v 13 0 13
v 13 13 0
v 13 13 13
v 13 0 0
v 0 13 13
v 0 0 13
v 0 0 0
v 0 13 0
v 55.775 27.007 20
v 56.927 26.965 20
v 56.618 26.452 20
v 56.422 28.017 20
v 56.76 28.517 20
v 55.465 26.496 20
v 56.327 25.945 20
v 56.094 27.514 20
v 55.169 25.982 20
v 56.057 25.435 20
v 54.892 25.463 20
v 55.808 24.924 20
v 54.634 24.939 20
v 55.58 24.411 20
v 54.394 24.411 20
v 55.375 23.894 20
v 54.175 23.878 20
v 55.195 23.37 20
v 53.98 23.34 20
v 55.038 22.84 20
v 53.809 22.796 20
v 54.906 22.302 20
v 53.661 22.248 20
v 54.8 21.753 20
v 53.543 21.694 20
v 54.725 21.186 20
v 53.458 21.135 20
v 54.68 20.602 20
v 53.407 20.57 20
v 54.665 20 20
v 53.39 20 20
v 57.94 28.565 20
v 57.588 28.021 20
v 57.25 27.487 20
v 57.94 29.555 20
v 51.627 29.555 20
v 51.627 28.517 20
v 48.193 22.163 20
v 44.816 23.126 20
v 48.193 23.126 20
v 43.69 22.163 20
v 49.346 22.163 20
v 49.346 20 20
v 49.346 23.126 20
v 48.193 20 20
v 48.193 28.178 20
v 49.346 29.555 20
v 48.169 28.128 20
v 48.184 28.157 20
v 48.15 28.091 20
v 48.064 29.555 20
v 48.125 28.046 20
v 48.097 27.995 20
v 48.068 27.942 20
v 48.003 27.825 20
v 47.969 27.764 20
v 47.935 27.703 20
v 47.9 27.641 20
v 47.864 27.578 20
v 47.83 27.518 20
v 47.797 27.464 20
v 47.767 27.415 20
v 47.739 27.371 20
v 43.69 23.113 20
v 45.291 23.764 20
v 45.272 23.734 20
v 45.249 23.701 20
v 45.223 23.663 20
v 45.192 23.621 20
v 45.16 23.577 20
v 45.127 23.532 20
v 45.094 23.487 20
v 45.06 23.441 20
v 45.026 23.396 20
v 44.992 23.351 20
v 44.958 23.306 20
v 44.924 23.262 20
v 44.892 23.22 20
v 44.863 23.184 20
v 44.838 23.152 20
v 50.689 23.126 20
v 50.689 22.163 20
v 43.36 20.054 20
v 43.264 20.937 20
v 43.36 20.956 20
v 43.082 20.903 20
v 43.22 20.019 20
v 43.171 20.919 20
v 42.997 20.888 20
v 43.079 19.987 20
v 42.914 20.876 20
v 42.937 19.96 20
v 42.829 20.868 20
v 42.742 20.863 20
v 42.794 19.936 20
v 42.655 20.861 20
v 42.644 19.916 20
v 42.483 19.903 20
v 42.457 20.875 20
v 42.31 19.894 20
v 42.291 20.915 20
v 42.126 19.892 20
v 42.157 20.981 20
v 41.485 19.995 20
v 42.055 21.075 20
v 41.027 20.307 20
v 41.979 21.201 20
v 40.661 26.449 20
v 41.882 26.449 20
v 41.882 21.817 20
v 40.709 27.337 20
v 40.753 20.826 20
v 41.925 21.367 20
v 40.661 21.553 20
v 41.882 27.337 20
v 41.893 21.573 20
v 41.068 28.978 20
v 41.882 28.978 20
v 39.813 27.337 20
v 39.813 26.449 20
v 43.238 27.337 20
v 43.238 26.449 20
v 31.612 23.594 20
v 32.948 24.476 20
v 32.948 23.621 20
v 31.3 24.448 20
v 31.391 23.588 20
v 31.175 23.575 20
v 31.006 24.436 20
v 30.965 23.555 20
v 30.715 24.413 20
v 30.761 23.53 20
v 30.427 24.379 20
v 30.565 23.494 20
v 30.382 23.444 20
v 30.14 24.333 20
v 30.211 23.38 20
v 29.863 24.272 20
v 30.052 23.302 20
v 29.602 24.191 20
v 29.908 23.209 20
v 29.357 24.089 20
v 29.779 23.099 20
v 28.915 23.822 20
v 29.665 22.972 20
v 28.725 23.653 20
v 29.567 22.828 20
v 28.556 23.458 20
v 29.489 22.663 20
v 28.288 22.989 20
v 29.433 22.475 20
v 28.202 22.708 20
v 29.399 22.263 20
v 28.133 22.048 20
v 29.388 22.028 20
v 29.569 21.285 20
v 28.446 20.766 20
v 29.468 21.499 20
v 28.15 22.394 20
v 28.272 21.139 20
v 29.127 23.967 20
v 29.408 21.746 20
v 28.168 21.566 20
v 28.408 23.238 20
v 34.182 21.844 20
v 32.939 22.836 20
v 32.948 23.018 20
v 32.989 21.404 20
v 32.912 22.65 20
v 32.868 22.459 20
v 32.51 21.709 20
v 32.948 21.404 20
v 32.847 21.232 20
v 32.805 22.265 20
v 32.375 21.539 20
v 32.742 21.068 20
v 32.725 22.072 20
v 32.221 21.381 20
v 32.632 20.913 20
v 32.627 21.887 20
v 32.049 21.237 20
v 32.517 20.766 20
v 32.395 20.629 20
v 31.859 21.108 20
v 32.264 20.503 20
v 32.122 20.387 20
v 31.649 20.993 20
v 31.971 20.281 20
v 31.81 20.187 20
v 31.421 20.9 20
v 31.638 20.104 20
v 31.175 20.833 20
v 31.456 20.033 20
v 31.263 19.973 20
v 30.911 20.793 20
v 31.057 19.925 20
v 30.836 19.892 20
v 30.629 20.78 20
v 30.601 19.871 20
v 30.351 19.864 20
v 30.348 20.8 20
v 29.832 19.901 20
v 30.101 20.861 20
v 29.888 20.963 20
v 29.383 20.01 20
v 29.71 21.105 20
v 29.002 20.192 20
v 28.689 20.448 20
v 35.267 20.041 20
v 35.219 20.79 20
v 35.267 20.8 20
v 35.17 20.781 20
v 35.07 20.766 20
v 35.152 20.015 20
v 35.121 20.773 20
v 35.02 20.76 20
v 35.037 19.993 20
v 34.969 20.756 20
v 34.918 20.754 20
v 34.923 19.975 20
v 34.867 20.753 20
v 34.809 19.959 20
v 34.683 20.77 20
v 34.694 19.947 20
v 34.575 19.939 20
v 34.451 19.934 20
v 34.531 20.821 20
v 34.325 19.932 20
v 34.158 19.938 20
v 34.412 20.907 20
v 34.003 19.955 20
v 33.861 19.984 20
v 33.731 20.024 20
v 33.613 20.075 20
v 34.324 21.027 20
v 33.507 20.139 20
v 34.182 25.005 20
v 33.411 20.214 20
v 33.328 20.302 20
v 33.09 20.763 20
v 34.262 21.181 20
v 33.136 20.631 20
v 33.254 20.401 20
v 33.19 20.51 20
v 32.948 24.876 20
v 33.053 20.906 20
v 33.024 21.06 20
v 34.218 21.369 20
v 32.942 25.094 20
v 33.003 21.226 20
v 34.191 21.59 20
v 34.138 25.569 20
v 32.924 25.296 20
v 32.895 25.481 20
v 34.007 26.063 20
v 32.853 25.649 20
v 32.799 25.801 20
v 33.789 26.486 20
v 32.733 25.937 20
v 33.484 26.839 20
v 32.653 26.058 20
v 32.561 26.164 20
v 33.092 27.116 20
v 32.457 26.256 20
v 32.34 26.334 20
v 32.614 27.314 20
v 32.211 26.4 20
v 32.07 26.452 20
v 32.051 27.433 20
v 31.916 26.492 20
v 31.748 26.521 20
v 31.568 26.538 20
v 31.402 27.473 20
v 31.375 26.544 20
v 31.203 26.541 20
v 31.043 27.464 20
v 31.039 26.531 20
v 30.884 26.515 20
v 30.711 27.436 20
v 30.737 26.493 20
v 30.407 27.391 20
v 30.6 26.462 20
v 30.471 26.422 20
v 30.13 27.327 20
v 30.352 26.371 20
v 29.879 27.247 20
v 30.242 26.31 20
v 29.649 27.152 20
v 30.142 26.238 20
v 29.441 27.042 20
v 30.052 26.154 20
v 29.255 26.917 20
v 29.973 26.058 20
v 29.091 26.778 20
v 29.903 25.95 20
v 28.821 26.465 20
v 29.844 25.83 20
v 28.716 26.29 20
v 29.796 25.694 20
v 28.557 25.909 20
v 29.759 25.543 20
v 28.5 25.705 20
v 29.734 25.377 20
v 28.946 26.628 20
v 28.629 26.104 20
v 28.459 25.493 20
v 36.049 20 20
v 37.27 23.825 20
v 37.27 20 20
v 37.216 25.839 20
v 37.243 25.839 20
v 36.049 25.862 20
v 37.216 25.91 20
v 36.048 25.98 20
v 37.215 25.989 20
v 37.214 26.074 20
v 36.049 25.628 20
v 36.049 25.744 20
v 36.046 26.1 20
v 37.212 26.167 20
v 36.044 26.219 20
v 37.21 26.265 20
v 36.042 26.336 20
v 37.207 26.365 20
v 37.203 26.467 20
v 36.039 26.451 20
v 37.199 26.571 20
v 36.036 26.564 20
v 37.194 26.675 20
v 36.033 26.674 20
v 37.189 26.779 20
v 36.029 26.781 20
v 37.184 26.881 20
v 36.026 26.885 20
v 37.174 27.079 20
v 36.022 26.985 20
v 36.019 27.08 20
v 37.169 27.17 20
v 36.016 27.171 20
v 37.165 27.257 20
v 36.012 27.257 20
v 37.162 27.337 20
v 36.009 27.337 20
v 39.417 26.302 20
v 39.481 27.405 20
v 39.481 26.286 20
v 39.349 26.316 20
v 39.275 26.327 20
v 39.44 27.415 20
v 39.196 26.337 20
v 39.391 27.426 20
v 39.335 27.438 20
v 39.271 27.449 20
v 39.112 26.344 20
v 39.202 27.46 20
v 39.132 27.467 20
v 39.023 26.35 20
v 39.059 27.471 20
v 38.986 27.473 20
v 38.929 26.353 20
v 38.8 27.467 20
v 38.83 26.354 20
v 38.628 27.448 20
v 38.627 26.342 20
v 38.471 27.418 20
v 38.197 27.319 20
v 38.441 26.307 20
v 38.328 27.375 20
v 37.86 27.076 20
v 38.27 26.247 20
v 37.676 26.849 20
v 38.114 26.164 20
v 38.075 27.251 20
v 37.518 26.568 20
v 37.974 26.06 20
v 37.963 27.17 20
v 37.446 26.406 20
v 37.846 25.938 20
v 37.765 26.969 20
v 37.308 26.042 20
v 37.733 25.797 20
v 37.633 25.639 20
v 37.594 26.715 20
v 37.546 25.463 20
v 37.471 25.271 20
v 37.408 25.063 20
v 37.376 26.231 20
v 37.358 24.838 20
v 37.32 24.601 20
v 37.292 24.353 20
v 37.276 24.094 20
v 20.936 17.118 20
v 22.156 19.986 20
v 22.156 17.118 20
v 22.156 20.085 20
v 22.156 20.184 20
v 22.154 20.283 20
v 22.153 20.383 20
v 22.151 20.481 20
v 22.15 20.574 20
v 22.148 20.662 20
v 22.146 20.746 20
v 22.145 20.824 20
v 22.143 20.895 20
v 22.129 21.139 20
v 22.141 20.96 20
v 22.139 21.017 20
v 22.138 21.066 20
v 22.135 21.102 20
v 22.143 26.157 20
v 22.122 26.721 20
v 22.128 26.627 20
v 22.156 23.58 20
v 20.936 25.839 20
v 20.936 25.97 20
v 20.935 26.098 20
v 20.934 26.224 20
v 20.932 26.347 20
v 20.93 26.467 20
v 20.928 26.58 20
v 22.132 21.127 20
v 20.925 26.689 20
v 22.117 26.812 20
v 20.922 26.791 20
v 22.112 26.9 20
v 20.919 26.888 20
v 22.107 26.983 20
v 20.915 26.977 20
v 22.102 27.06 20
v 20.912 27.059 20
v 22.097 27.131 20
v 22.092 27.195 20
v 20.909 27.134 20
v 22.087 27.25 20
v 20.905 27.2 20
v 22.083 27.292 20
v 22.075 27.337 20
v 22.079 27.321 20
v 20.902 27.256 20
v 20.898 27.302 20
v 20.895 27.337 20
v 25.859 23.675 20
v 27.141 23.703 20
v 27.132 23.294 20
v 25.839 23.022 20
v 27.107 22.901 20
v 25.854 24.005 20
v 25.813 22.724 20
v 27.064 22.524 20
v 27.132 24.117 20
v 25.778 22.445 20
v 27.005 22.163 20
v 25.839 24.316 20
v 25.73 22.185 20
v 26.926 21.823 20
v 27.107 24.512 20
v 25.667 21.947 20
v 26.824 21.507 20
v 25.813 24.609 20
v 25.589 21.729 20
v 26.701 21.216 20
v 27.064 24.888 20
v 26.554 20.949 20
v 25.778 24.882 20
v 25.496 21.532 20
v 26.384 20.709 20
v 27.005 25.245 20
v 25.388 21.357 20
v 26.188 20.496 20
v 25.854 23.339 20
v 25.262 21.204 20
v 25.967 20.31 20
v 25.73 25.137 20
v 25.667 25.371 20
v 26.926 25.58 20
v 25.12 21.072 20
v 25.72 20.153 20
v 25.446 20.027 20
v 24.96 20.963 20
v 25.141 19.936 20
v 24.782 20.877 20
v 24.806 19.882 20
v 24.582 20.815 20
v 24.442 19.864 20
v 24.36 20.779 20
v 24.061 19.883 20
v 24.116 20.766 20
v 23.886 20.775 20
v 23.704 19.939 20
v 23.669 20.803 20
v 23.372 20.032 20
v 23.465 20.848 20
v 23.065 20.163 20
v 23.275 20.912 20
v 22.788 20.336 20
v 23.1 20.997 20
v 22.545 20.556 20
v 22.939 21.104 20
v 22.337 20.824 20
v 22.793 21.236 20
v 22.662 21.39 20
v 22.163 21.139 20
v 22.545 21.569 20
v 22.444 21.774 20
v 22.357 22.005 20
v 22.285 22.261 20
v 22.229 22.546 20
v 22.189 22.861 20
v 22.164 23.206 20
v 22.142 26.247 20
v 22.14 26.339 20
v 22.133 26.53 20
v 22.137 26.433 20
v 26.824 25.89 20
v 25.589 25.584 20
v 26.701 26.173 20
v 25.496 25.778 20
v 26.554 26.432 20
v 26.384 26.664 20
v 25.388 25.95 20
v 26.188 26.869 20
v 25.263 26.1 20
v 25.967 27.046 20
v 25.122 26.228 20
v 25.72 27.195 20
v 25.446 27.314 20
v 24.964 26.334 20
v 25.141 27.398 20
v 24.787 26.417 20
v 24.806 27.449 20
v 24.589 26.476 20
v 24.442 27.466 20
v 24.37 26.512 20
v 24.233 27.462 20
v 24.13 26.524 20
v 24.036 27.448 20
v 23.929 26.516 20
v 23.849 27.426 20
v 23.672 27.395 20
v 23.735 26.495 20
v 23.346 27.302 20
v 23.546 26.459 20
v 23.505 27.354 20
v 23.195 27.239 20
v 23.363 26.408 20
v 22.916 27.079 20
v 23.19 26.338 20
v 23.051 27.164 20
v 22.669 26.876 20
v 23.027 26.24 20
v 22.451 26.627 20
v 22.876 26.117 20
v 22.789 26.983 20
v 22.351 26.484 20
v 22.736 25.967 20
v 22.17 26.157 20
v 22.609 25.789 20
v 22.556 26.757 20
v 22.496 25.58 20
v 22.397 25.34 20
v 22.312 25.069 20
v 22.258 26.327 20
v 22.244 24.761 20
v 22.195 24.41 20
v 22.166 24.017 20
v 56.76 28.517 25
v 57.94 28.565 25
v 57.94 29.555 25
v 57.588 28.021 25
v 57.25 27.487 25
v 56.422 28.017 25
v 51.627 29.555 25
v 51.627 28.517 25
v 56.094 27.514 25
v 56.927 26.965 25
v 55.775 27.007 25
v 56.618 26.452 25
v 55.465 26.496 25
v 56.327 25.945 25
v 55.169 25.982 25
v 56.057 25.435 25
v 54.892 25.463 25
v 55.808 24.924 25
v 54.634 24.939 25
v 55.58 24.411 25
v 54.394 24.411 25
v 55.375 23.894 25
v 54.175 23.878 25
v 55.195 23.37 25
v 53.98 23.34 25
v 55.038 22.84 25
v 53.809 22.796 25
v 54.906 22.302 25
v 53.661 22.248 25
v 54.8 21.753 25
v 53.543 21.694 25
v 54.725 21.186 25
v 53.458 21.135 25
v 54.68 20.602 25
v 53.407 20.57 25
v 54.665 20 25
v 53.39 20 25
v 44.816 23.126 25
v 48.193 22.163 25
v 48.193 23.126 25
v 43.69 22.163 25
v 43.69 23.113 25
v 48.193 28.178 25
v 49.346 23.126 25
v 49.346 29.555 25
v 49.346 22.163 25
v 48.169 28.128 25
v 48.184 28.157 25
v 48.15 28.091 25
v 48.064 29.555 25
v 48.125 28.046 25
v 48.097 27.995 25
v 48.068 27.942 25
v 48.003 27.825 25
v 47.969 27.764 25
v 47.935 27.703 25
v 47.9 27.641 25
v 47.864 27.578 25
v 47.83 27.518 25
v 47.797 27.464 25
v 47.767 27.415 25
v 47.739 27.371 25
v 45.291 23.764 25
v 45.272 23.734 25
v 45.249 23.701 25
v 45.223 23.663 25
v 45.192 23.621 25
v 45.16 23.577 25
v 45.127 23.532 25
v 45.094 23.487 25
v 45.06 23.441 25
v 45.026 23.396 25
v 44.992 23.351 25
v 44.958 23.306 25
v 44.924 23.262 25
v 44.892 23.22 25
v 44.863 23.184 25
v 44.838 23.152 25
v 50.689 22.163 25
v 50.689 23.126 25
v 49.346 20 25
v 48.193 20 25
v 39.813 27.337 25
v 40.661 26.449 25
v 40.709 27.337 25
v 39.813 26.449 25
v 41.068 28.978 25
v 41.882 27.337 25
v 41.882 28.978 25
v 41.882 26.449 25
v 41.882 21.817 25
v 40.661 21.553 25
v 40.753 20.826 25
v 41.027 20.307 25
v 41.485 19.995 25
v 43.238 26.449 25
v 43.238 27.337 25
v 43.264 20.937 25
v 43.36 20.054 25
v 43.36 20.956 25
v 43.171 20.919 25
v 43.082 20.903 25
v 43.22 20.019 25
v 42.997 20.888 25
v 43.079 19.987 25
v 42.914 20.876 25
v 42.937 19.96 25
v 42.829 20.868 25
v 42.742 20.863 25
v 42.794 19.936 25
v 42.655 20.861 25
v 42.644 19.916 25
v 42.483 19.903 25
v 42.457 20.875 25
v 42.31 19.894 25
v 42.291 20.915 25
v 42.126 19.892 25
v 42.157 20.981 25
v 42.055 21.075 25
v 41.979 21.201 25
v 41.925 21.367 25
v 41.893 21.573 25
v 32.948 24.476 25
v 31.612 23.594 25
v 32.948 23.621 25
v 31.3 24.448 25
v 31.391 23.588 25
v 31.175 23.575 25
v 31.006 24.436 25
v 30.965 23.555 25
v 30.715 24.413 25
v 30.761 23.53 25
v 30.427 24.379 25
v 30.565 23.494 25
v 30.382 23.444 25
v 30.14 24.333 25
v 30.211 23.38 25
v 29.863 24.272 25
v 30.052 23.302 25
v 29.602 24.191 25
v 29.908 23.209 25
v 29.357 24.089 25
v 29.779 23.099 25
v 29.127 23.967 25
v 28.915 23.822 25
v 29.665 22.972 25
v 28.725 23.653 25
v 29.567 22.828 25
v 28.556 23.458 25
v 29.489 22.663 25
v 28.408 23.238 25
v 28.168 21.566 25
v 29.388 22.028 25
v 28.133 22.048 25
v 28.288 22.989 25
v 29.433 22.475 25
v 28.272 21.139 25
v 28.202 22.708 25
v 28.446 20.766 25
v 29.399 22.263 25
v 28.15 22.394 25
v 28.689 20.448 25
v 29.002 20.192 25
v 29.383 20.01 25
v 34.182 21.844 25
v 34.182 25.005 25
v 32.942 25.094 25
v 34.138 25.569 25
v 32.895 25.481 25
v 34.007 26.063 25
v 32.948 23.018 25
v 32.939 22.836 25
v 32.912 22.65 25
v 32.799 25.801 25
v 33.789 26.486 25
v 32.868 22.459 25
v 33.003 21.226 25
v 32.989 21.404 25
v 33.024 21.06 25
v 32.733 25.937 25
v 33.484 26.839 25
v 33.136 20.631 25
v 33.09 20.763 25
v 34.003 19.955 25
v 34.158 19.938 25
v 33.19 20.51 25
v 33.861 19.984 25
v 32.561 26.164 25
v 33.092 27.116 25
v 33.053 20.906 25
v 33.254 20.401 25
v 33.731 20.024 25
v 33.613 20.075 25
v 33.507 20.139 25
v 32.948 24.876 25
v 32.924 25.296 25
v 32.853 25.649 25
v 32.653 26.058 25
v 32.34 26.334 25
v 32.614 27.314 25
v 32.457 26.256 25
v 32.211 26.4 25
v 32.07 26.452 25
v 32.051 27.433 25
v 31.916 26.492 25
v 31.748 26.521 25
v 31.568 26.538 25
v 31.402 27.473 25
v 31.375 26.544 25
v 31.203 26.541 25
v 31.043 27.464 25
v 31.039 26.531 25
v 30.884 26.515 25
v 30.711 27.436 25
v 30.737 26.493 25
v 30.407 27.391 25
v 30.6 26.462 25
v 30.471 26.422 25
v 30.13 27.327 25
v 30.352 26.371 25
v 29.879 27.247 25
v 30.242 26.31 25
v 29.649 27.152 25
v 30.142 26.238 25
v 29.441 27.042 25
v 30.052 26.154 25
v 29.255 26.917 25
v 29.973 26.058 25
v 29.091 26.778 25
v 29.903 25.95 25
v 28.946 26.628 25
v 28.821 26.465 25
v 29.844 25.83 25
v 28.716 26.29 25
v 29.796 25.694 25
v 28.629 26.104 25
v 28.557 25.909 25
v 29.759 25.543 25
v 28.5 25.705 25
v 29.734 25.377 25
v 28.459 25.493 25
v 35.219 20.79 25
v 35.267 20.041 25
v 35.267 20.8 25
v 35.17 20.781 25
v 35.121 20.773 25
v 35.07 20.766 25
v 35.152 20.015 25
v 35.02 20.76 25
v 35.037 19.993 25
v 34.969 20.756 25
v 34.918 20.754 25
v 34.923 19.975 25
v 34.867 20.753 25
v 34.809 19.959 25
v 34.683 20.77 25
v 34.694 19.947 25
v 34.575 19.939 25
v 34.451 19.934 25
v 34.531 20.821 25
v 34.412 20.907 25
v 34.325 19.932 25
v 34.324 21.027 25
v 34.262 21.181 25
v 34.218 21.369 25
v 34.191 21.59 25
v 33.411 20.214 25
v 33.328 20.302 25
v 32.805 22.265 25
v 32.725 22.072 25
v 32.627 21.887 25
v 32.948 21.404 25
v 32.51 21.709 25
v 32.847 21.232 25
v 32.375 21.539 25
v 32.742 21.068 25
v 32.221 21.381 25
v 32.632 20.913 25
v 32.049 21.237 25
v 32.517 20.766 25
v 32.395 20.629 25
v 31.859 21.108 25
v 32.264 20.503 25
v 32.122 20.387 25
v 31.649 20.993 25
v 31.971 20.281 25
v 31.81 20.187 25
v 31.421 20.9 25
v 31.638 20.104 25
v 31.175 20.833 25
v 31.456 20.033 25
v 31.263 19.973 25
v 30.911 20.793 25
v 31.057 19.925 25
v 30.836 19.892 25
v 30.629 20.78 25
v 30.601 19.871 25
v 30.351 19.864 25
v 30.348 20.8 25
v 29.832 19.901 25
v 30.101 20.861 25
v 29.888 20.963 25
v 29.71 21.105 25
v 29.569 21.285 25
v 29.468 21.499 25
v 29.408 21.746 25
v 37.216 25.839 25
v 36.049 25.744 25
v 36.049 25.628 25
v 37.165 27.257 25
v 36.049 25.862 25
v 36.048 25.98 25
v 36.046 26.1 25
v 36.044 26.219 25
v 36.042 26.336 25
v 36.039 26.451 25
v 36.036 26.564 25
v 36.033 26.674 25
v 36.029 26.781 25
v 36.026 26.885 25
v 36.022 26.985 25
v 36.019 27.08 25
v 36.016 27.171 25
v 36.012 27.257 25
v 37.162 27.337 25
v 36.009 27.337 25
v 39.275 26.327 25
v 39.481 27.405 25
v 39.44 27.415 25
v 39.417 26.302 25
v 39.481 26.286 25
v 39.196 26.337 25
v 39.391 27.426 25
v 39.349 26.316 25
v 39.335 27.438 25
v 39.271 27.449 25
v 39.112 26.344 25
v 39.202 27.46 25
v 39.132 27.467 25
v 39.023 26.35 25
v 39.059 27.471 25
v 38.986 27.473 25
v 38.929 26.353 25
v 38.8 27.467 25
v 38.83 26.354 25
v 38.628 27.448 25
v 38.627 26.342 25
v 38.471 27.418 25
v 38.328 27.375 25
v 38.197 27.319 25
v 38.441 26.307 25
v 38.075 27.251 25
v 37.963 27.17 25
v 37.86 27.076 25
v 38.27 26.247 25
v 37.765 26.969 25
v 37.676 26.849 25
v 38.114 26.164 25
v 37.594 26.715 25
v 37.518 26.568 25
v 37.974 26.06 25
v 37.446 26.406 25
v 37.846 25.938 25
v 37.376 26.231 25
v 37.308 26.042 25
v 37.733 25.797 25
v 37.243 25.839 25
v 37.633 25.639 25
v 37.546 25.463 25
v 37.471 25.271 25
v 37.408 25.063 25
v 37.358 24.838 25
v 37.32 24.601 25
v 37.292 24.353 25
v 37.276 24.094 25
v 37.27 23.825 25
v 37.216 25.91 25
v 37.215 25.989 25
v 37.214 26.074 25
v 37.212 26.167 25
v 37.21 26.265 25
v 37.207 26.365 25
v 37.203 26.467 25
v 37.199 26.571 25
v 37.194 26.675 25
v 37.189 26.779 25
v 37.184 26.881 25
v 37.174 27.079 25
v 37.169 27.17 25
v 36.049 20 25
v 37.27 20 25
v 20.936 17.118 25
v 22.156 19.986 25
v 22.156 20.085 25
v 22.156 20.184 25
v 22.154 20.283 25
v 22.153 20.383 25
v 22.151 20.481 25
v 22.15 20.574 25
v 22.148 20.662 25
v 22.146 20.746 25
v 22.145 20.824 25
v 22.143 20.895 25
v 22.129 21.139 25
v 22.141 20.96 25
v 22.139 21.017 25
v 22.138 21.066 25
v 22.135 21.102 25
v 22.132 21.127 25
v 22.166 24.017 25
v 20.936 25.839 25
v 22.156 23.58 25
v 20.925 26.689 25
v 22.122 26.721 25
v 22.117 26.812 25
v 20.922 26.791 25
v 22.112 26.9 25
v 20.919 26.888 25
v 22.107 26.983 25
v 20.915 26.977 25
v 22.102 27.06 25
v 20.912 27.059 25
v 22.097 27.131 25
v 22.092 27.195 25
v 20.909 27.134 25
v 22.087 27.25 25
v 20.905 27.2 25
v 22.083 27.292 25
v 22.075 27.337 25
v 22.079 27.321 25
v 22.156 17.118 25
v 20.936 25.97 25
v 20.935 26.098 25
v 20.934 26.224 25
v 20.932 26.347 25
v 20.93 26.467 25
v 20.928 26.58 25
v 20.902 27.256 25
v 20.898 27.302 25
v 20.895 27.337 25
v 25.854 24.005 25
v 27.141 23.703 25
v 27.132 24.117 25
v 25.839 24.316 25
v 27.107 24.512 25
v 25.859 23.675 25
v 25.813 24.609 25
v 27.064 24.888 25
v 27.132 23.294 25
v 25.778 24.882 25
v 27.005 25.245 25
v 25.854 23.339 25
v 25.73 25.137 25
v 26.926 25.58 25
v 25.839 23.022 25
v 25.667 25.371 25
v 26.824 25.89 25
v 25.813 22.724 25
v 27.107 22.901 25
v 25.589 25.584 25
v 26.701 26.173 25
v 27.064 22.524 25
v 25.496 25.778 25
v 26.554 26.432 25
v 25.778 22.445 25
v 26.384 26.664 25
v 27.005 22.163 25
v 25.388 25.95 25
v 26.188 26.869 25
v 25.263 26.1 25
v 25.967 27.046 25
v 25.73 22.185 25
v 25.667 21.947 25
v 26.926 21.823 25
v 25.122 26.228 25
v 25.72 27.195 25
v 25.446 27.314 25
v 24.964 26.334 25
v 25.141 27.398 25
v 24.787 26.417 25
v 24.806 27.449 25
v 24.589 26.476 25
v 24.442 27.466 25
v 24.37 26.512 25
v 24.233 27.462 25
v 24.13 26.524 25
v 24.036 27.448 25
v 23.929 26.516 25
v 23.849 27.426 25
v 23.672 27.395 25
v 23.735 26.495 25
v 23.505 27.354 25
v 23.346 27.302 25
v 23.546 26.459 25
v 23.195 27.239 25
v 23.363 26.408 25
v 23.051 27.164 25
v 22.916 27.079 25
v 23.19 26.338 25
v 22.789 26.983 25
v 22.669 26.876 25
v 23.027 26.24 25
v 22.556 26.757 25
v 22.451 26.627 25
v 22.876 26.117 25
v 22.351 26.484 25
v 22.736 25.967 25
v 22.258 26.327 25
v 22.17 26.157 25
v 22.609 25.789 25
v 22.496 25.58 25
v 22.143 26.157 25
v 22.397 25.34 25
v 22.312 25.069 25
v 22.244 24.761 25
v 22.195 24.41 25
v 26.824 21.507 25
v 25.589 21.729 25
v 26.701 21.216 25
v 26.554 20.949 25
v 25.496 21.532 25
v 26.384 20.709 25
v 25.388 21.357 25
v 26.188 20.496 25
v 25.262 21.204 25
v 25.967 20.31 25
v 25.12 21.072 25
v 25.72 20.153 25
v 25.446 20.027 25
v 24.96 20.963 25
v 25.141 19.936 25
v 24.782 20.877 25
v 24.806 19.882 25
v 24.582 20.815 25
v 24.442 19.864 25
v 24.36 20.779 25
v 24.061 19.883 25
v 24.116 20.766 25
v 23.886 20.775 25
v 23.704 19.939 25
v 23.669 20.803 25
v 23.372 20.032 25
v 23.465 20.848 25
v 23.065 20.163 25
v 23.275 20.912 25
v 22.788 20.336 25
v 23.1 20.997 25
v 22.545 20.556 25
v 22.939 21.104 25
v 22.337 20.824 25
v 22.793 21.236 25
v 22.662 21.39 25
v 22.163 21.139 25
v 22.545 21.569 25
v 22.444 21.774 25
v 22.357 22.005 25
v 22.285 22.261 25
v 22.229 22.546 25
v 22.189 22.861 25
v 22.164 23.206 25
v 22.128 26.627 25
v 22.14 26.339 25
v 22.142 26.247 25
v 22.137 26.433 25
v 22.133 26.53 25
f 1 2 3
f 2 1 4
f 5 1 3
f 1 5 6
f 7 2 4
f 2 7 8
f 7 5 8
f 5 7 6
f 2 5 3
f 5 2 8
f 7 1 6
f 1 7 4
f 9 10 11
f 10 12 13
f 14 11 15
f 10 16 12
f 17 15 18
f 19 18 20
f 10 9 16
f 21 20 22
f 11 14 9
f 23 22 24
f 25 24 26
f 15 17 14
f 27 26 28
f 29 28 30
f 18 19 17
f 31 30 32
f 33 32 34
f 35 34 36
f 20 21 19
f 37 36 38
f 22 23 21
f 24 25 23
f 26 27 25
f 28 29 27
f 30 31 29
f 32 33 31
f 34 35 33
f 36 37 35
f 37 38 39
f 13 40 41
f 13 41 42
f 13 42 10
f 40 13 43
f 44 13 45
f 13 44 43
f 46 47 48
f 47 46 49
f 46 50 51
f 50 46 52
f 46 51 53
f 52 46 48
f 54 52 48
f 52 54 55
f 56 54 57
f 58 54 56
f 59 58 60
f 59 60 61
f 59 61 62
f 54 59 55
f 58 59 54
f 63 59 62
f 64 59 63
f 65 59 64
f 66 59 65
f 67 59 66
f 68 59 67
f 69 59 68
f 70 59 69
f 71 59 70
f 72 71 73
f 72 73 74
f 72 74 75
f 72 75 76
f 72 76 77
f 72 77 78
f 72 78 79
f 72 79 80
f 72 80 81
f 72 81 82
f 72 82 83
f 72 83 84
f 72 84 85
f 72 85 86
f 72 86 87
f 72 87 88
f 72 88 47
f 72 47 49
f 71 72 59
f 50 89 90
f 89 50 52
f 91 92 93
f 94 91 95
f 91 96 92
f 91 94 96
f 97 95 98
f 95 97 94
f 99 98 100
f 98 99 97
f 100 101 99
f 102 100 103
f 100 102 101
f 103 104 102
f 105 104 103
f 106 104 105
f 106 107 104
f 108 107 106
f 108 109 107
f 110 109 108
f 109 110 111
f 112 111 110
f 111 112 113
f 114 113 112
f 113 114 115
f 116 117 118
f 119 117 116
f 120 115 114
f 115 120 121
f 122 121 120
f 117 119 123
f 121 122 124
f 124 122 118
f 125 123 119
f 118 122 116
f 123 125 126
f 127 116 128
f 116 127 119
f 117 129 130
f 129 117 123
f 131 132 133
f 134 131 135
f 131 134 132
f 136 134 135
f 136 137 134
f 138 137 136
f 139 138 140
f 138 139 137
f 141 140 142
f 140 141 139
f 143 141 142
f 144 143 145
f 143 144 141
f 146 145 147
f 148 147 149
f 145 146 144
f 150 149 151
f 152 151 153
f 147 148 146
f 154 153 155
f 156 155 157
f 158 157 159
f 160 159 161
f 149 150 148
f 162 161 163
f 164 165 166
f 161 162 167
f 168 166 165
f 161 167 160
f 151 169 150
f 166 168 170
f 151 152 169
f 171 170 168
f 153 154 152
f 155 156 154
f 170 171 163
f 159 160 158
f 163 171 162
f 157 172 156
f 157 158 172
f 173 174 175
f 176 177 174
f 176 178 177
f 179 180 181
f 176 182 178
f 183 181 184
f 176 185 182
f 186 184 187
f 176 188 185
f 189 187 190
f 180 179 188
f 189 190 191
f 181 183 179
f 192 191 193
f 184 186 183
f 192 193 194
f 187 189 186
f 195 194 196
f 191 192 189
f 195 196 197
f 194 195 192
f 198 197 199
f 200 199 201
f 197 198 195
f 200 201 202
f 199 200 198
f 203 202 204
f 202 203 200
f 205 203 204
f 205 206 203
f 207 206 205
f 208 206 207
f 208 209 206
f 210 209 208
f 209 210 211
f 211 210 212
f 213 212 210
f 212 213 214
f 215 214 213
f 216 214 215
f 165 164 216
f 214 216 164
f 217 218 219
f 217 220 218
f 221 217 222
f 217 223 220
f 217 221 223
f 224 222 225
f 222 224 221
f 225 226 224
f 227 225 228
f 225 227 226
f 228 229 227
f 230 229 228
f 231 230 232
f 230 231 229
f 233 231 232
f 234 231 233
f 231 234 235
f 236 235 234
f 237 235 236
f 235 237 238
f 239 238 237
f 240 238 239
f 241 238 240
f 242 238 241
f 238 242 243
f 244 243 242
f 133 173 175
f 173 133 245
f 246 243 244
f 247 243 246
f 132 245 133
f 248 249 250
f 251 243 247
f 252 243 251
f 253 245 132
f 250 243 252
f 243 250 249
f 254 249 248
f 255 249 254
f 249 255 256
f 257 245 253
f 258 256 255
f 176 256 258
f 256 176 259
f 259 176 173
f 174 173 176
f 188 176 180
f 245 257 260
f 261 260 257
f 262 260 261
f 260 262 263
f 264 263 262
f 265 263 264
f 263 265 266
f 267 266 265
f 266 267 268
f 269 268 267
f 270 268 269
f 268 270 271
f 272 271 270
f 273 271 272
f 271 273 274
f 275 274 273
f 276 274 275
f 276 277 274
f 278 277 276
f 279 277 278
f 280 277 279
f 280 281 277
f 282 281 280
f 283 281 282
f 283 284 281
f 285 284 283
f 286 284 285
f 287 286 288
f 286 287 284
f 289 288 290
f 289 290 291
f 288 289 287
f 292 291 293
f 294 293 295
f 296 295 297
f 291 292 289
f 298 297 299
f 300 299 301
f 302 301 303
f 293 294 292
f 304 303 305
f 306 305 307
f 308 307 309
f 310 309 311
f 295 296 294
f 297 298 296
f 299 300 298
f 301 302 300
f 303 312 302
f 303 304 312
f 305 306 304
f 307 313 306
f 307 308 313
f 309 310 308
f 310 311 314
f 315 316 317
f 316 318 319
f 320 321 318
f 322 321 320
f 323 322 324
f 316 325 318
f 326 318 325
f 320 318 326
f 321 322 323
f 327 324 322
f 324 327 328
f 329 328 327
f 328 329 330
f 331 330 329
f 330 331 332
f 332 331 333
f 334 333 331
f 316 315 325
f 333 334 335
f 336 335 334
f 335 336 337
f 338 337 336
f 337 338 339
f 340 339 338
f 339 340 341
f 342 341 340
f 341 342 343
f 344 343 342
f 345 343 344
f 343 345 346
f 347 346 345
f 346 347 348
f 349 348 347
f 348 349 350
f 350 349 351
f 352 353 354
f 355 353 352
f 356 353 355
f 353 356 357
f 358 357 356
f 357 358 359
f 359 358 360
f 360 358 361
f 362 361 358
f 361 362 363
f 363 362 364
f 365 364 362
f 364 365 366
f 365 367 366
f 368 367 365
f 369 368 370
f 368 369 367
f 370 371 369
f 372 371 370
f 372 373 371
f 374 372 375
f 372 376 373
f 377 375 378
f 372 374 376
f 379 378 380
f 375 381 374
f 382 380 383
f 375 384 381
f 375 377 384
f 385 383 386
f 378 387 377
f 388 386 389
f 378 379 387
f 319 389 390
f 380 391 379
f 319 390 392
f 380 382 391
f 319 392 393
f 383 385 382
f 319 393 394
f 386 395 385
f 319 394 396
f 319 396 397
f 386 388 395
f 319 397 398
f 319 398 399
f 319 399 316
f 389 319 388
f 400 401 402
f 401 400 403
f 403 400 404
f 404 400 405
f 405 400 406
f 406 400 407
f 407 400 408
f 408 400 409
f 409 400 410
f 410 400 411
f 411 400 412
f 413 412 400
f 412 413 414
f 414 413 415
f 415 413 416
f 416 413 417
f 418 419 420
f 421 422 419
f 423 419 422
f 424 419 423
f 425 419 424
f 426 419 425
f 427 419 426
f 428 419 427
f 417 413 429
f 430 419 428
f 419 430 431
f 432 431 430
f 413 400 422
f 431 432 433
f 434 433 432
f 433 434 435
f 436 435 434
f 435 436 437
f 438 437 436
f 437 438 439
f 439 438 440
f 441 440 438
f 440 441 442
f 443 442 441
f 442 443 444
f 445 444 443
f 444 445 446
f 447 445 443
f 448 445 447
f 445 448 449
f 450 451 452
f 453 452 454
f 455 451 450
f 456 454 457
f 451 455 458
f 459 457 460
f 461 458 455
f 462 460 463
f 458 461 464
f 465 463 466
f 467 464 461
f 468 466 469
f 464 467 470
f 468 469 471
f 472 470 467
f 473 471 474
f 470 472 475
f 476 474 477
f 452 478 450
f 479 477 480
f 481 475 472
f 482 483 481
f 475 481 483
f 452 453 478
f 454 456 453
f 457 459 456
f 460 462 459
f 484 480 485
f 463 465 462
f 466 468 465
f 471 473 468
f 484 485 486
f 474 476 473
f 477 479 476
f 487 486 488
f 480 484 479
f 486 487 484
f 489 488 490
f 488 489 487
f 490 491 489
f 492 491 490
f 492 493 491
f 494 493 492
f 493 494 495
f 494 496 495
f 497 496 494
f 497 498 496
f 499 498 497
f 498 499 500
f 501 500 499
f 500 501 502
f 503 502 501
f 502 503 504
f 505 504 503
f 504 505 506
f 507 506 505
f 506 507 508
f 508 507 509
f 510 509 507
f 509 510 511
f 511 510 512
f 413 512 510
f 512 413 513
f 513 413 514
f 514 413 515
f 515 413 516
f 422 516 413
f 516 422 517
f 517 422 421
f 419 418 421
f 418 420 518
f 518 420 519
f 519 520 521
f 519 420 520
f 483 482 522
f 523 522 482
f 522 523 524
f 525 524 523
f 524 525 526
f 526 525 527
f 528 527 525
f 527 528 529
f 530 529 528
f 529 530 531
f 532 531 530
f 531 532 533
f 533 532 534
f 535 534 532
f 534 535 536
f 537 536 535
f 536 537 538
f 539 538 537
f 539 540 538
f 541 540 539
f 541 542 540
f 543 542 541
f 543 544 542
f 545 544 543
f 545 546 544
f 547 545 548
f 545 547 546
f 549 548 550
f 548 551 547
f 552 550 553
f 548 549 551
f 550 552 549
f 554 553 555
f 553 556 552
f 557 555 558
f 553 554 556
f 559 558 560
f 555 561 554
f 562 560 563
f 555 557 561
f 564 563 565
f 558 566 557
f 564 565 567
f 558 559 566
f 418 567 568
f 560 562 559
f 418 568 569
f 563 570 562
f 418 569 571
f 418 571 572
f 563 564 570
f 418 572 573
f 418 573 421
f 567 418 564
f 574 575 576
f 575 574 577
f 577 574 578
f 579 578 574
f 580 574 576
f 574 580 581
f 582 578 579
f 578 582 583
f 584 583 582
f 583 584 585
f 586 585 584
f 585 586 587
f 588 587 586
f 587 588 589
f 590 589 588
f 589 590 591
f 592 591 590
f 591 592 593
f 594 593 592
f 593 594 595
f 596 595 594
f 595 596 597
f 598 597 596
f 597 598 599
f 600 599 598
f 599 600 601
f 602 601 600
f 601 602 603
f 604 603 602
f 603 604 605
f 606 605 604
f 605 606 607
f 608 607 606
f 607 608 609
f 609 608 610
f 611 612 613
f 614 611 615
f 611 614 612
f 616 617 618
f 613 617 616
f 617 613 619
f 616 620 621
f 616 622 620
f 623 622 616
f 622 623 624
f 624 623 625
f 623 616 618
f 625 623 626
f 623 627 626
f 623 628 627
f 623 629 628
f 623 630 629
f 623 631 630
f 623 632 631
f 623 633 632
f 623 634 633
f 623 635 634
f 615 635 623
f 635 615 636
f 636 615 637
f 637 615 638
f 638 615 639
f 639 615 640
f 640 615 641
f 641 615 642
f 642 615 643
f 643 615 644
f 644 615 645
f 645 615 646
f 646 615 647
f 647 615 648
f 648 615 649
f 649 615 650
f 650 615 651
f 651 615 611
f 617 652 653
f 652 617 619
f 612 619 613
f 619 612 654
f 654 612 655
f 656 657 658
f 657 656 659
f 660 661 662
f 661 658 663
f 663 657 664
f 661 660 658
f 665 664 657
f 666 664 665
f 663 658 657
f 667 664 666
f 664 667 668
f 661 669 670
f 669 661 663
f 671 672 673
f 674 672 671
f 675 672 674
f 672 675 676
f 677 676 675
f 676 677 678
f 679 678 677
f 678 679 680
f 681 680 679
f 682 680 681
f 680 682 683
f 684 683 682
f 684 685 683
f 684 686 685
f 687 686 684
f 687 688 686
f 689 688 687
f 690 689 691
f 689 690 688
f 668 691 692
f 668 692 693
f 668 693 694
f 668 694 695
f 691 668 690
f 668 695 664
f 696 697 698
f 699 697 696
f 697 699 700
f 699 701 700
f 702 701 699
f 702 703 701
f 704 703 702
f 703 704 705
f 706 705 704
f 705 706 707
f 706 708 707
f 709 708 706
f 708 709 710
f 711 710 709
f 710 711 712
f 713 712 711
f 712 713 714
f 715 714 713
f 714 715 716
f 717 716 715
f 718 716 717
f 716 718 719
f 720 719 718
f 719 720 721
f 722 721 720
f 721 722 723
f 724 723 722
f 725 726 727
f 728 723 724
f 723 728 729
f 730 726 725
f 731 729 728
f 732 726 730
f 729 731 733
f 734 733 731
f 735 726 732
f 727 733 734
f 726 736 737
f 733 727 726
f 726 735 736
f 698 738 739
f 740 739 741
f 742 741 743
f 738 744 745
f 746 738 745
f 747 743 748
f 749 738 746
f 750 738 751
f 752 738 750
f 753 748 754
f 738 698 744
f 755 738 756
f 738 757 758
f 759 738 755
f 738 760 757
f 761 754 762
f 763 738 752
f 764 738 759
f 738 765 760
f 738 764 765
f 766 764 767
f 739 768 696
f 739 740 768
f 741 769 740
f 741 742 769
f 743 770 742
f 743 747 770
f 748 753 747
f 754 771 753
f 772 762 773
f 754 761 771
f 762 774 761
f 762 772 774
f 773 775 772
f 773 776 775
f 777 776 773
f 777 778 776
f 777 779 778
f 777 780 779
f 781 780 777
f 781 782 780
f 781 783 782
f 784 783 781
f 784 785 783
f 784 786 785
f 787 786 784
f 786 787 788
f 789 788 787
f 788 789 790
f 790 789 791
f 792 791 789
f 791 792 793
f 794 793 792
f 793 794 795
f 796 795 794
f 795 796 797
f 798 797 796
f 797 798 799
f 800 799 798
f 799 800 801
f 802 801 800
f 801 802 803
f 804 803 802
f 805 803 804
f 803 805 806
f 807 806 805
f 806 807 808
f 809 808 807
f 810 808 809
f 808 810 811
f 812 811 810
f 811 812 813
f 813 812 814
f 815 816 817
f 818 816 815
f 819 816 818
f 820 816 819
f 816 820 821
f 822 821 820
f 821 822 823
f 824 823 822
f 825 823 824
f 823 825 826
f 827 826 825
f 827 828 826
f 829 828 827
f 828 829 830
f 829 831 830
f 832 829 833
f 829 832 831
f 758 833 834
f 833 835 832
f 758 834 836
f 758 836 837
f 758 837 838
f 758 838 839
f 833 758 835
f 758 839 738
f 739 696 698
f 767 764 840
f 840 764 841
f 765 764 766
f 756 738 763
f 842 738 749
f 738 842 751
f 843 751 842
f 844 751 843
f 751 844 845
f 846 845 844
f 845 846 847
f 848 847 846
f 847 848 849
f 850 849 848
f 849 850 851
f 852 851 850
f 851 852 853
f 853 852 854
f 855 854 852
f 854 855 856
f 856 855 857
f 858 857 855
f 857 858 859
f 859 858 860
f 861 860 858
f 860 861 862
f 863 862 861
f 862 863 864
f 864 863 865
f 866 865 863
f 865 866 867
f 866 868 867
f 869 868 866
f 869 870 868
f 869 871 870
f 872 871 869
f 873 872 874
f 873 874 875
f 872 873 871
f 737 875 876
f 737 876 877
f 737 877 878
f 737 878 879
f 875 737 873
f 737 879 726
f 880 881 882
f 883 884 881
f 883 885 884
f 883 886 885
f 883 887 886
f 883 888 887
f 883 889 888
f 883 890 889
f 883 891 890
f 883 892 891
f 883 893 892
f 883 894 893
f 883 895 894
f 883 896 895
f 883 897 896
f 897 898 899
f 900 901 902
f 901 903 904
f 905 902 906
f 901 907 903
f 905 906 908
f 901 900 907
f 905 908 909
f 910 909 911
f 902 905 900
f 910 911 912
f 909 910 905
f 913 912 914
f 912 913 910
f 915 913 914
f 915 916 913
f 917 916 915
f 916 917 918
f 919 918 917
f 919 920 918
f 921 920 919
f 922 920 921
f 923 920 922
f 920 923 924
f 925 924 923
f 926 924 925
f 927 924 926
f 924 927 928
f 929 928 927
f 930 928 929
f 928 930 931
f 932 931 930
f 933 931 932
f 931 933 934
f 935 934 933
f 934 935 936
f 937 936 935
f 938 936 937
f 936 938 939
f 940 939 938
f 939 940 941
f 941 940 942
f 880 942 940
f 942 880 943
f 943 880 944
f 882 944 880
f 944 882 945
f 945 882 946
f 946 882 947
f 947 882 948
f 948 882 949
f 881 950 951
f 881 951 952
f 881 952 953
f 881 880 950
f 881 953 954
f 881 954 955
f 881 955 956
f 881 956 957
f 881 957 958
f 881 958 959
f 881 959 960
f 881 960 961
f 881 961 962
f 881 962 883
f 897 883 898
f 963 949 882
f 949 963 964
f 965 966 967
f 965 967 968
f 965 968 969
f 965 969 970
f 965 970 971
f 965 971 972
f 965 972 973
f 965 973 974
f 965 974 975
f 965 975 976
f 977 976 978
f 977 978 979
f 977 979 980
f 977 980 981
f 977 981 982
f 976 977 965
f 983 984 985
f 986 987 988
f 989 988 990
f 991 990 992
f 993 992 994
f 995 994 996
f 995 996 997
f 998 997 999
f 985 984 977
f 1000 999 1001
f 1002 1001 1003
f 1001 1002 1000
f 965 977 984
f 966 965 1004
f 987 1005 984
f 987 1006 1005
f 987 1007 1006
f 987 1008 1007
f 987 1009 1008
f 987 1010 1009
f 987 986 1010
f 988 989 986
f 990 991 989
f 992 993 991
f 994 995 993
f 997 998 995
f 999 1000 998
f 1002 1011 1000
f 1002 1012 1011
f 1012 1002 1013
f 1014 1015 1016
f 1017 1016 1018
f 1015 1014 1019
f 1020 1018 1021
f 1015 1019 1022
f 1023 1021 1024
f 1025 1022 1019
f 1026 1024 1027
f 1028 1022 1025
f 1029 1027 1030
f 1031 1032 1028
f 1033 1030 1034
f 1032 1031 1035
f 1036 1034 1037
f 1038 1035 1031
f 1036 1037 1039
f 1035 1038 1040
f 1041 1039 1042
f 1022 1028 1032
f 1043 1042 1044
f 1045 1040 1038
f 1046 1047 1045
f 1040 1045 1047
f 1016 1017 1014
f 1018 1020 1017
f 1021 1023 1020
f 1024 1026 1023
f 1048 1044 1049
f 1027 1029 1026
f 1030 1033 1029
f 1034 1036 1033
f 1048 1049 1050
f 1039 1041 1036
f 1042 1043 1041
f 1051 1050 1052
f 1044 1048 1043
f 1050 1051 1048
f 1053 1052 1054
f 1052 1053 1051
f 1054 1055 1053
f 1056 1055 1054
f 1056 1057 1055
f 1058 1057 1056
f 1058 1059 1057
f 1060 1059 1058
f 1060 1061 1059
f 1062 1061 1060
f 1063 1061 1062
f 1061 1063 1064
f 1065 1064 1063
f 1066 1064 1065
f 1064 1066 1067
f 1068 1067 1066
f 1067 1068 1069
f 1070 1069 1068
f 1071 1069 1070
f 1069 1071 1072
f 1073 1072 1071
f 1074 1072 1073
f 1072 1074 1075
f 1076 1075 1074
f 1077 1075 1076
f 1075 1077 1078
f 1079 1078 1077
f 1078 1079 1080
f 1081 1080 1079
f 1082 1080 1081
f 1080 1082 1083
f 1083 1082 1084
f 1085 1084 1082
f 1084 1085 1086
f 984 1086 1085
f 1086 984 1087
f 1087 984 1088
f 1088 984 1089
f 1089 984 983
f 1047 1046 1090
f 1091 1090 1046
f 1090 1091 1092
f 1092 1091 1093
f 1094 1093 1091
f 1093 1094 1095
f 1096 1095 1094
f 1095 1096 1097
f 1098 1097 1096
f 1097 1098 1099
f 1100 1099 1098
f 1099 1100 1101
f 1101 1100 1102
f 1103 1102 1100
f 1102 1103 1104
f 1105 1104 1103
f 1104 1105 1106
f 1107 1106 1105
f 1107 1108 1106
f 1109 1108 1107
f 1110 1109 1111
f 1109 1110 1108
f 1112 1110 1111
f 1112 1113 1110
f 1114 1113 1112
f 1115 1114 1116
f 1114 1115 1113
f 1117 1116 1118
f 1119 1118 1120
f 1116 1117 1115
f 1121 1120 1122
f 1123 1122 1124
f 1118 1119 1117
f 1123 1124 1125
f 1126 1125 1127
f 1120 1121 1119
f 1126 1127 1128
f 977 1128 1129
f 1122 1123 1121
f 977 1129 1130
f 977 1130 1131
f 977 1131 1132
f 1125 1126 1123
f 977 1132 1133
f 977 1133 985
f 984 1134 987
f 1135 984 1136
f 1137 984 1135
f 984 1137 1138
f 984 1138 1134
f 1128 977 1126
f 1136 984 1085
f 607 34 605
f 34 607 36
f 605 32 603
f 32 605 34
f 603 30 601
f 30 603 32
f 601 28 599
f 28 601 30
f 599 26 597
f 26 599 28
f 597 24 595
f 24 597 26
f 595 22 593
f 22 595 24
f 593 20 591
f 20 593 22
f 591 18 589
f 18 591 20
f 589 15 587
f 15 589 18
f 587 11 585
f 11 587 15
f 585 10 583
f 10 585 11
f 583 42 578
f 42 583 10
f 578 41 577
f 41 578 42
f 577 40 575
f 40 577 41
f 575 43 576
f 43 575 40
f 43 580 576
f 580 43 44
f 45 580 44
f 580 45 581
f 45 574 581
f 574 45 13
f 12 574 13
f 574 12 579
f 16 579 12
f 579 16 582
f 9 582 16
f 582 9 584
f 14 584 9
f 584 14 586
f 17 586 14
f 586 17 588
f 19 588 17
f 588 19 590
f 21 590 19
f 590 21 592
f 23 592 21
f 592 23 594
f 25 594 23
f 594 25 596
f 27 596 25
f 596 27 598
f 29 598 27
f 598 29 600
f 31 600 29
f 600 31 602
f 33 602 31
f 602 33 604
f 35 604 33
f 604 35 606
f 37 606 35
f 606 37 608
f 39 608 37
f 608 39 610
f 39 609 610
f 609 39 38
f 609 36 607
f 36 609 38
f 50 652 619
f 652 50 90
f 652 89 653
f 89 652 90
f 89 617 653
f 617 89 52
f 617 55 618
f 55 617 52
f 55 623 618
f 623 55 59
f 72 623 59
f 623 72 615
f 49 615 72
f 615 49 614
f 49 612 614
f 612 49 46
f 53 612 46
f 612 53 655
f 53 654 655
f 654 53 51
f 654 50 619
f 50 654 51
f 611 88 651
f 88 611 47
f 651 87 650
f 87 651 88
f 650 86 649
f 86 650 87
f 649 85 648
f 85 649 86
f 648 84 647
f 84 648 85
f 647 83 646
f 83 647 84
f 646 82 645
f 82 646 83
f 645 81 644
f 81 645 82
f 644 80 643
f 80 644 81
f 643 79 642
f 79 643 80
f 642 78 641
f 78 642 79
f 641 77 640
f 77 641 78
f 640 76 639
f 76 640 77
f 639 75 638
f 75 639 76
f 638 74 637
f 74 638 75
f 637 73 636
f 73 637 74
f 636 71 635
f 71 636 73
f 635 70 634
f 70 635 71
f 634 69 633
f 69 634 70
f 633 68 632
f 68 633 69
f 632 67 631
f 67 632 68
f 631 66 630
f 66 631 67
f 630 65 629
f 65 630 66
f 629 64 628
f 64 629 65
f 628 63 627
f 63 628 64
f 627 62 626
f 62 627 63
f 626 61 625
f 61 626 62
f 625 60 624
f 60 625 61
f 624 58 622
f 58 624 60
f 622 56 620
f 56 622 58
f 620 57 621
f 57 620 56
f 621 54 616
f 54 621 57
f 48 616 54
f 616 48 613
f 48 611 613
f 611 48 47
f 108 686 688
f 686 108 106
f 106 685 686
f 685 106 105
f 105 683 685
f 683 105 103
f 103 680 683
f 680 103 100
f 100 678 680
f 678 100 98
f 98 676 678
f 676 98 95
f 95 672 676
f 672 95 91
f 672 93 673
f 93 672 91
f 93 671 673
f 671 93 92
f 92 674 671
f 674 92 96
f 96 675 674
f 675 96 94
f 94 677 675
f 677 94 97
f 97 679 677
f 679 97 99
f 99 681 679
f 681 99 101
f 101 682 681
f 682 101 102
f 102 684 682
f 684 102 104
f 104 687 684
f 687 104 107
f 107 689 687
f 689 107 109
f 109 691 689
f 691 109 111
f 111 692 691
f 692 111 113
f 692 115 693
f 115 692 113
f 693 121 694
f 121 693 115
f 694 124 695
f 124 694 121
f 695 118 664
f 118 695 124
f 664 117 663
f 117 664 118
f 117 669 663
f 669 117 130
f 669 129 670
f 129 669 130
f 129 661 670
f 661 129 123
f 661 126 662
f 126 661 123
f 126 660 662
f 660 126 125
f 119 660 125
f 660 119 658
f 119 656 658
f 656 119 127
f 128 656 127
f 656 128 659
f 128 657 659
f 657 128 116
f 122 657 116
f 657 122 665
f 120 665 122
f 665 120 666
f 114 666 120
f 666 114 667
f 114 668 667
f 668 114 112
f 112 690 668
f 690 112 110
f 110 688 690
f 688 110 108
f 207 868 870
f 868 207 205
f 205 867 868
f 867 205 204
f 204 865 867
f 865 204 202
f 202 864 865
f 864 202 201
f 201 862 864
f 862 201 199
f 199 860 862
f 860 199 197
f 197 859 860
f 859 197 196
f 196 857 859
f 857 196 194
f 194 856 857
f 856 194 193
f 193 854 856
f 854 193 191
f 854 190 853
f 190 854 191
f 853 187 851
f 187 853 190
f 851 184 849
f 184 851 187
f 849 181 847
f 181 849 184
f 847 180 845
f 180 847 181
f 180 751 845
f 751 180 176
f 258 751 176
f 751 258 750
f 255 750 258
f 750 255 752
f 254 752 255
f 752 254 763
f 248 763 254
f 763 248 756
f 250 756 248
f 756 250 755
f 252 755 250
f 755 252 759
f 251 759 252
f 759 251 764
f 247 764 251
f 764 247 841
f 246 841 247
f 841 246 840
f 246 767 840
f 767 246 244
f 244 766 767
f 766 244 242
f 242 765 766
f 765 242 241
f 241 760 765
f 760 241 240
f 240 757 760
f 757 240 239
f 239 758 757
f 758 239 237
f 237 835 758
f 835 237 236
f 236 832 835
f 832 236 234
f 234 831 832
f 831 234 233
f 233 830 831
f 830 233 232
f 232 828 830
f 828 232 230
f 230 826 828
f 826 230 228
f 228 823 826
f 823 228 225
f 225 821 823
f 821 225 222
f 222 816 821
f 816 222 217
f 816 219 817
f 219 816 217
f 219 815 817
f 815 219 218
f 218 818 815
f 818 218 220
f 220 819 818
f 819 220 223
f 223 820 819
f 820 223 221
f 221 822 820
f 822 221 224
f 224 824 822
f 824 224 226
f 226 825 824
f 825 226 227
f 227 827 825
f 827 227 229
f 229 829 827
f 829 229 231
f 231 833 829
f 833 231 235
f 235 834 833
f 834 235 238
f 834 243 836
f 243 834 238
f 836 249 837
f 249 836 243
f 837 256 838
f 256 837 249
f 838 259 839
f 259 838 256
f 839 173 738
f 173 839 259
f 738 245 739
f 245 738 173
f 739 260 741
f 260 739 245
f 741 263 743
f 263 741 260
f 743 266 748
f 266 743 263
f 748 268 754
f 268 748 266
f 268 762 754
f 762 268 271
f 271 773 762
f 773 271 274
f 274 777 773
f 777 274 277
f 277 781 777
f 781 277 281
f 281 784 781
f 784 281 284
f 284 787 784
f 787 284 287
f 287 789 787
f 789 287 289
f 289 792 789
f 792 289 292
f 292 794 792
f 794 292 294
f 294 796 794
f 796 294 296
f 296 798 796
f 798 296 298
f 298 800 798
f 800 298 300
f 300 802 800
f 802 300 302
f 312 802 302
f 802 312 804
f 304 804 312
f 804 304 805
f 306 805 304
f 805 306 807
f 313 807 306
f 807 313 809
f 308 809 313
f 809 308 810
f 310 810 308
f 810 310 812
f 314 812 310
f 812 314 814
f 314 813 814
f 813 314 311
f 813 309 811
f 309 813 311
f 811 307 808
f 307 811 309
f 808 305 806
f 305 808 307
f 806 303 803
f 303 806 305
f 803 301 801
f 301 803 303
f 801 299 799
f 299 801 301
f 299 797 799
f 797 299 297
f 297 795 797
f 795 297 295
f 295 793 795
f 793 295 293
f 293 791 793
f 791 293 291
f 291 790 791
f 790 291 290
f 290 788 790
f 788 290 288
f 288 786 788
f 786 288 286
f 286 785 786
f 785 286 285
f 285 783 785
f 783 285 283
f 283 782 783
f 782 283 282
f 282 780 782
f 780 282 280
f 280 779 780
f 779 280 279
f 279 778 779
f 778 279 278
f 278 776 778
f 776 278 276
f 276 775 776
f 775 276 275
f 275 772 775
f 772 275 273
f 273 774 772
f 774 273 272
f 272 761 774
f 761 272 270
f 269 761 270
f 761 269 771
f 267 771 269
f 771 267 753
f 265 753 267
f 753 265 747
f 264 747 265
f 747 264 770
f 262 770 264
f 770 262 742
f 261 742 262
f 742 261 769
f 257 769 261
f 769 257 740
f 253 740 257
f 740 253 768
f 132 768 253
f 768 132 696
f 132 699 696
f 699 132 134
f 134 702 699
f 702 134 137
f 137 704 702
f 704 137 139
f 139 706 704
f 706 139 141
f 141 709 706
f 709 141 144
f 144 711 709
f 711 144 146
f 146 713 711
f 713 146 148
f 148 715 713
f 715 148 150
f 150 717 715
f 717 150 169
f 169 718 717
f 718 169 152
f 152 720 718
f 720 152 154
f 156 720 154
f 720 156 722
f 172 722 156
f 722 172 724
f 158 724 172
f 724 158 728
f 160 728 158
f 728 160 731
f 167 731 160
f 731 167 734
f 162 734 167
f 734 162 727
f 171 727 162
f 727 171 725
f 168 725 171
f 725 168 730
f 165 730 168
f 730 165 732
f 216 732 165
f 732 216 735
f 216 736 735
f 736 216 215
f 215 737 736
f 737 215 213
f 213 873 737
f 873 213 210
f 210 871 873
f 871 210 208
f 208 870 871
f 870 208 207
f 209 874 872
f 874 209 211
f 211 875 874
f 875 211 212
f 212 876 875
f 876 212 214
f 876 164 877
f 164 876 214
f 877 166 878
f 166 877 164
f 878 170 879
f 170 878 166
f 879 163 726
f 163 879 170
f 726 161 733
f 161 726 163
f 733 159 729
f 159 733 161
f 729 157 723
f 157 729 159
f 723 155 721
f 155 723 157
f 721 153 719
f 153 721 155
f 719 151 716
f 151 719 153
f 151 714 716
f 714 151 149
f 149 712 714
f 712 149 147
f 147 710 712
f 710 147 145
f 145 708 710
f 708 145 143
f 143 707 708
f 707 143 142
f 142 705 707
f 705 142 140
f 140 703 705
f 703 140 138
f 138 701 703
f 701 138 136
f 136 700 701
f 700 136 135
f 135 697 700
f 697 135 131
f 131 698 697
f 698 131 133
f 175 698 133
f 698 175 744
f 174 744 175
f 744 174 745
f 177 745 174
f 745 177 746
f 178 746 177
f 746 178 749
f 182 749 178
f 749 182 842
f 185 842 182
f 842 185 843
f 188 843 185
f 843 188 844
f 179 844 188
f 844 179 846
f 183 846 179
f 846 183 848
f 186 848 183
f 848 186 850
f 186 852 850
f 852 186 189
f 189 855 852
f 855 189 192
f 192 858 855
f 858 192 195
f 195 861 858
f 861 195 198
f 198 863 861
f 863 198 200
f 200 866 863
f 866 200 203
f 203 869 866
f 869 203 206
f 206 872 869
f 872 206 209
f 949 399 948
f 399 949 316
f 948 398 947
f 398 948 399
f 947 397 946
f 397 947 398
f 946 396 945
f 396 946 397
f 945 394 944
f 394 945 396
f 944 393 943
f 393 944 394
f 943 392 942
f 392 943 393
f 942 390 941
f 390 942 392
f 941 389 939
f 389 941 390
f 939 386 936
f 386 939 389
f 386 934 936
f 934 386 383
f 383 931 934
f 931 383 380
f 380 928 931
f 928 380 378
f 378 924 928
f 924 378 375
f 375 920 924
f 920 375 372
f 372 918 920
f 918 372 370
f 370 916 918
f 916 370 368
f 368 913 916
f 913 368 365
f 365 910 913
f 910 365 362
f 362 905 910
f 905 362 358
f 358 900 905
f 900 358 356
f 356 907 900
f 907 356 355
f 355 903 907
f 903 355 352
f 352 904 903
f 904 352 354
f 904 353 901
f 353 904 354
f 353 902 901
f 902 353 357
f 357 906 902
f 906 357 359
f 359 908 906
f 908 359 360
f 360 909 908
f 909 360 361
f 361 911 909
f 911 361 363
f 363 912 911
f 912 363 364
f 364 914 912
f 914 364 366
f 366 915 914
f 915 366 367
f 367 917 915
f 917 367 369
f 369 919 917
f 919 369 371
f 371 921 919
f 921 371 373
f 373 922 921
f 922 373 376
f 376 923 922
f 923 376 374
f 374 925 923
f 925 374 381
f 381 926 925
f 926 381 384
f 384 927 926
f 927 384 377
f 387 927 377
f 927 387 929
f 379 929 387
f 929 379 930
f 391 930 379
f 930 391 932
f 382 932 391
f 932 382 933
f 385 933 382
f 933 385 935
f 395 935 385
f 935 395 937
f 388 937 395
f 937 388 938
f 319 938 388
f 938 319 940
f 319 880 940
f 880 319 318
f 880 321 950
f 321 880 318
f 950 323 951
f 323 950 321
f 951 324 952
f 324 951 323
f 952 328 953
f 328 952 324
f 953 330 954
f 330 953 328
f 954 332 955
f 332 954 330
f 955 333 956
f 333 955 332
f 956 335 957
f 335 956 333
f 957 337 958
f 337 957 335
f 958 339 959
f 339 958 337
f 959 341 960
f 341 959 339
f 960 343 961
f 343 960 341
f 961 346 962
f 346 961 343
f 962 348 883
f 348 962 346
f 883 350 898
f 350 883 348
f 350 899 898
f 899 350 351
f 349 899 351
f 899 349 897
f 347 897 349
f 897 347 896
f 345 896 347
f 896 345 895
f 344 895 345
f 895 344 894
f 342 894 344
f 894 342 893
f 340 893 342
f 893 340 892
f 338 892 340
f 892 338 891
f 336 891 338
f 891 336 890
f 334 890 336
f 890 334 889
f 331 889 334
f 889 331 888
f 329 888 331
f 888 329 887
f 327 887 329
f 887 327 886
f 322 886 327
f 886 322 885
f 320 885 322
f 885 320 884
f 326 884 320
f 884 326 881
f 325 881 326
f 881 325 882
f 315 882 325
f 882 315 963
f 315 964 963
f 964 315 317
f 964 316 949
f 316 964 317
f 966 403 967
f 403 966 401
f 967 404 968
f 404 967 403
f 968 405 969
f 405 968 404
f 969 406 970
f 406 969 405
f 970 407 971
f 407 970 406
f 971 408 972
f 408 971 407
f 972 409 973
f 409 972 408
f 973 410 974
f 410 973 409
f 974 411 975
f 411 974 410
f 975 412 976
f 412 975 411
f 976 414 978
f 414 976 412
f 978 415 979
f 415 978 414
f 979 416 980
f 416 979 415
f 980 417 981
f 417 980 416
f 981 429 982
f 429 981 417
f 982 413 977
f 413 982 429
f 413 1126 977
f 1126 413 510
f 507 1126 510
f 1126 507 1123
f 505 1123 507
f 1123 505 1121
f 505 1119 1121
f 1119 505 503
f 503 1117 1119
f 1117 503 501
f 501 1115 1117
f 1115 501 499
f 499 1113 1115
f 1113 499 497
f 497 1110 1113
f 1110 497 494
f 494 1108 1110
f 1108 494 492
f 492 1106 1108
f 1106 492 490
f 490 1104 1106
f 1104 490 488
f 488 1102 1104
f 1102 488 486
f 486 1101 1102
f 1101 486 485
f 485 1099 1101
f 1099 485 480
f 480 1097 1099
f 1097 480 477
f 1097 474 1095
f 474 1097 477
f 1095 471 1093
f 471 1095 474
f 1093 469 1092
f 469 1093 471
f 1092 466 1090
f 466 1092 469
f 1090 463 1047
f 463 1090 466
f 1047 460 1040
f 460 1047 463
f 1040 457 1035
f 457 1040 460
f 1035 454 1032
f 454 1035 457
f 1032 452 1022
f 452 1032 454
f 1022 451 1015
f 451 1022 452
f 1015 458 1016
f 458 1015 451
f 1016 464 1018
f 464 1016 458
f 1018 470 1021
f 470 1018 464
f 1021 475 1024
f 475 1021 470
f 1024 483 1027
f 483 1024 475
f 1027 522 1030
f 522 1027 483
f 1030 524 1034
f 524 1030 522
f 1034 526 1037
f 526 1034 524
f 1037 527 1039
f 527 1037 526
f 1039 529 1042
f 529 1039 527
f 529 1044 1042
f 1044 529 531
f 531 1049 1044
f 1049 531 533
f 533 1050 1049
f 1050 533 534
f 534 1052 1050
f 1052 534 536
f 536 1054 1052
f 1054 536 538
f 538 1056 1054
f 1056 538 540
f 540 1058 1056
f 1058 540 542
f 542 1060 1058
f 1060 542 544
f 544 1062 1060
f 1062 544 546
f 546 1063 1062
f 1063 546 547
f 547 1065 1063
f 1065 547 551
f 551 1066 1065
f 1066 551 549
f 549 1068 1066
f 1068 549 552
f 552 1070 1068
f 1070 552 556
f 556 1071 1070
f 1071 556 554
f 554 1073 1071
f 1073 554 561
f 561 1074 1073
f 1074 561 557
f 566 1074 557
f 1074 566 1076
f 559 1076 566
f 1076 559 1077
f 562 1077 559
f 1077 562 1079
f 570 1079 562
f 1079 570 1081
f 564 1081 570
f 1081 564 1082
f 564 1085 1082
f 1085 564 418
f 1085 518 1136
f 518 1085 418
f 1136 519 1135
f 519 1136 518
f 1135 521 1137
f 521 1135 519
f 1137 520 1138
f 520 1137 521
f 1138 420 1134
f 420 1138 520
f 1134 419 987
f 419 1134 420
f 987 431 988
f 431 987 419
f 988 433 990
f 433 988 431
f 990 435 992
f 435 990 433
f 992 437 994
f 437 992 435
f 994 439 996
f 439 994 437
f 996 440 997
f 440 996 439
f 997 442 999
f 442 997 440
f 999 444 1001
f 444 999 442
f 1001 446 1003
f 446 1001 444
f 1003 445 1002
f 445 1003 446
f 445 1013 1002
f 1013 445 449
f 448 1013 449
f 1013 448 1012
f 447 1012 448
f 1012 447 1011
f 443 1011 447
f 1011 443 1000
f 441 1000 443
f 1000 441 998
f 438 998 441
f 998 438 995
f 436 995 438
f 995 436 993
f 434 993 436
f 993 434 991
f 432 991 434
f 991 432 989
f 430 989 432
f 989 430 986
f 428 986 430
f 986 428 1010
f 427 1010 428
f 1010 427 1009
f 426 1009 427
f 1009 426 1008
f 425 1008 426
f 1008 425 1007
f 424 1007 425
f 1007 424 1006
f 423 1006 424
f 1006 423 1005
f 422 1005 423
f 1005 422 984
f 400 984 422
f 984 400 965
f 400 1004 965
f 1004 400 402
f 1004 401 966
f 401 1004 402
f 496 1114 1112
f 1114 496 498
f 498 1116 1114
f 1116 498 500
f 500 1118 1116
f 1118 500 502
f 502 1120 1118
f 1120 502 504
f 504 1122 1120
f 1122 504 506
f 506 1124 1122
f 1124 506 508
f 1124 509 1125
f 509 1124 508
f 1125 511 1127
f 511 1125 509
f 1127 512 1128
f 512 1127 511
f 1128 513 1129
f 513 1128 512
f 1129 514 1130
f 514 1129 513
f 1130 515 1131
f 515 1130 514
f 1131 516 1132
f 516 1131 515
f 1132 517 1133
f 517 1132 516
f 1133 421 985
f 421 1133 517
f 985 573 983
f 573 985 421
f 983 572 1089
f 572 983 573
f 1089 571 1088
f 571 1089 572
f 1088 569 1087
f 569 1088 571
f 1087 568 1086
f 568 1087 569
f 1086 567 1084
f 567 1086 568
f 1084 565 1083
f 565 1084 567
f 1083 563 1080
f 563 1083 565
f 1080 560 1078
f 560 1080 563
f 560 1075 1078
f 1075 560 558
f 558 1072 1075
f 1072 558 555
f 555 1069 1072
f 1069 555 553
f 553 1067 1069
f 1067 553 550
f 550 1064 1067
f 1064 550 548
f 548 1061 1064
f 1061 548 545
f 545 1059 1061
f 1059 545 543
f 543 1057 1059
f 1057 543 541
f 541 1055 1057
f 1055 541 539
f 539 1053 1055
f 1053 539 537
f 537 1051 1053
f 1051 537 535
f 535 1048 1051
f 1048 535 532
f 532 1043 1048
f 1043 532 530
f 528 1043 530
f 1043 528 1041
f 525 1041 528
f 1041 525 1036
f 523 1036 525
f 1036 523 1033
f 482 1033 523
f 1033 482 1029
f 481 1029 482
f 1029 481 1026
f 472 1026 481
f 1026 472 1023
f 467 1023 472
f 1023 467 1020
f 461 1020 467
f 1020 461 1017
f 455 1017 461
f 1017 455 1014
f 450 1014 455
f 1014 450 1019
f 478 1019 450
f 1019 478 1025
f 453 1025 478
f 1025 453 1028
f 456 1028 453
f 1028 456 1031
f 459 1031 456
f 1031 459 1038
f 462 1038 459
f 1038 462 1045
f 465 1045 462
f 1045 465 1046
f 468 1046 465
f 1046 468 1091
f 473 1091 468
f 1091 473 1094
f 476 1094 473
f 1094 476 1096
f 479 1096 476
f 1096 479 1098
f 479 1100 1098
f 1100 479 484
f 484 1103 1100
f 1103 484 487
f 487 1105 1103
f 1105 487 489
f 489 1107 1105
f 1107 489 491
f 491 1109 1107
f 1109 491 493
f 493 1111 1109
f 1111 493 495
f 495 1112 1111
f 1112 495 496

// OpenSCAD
//[CUSTOMIZATION]
// X Dimension
xdim=13;
// Y Dimension
ydim=19;
// Z Dimension
zdim=15;
// Message
txt="part47";
module __END_CUSTOMIZATIONS () {}
cube(xdim,ydim,zdim);
translate([20,20,20]) { linear_extrude(5) text(txt, font="Liberation Sans"); }
